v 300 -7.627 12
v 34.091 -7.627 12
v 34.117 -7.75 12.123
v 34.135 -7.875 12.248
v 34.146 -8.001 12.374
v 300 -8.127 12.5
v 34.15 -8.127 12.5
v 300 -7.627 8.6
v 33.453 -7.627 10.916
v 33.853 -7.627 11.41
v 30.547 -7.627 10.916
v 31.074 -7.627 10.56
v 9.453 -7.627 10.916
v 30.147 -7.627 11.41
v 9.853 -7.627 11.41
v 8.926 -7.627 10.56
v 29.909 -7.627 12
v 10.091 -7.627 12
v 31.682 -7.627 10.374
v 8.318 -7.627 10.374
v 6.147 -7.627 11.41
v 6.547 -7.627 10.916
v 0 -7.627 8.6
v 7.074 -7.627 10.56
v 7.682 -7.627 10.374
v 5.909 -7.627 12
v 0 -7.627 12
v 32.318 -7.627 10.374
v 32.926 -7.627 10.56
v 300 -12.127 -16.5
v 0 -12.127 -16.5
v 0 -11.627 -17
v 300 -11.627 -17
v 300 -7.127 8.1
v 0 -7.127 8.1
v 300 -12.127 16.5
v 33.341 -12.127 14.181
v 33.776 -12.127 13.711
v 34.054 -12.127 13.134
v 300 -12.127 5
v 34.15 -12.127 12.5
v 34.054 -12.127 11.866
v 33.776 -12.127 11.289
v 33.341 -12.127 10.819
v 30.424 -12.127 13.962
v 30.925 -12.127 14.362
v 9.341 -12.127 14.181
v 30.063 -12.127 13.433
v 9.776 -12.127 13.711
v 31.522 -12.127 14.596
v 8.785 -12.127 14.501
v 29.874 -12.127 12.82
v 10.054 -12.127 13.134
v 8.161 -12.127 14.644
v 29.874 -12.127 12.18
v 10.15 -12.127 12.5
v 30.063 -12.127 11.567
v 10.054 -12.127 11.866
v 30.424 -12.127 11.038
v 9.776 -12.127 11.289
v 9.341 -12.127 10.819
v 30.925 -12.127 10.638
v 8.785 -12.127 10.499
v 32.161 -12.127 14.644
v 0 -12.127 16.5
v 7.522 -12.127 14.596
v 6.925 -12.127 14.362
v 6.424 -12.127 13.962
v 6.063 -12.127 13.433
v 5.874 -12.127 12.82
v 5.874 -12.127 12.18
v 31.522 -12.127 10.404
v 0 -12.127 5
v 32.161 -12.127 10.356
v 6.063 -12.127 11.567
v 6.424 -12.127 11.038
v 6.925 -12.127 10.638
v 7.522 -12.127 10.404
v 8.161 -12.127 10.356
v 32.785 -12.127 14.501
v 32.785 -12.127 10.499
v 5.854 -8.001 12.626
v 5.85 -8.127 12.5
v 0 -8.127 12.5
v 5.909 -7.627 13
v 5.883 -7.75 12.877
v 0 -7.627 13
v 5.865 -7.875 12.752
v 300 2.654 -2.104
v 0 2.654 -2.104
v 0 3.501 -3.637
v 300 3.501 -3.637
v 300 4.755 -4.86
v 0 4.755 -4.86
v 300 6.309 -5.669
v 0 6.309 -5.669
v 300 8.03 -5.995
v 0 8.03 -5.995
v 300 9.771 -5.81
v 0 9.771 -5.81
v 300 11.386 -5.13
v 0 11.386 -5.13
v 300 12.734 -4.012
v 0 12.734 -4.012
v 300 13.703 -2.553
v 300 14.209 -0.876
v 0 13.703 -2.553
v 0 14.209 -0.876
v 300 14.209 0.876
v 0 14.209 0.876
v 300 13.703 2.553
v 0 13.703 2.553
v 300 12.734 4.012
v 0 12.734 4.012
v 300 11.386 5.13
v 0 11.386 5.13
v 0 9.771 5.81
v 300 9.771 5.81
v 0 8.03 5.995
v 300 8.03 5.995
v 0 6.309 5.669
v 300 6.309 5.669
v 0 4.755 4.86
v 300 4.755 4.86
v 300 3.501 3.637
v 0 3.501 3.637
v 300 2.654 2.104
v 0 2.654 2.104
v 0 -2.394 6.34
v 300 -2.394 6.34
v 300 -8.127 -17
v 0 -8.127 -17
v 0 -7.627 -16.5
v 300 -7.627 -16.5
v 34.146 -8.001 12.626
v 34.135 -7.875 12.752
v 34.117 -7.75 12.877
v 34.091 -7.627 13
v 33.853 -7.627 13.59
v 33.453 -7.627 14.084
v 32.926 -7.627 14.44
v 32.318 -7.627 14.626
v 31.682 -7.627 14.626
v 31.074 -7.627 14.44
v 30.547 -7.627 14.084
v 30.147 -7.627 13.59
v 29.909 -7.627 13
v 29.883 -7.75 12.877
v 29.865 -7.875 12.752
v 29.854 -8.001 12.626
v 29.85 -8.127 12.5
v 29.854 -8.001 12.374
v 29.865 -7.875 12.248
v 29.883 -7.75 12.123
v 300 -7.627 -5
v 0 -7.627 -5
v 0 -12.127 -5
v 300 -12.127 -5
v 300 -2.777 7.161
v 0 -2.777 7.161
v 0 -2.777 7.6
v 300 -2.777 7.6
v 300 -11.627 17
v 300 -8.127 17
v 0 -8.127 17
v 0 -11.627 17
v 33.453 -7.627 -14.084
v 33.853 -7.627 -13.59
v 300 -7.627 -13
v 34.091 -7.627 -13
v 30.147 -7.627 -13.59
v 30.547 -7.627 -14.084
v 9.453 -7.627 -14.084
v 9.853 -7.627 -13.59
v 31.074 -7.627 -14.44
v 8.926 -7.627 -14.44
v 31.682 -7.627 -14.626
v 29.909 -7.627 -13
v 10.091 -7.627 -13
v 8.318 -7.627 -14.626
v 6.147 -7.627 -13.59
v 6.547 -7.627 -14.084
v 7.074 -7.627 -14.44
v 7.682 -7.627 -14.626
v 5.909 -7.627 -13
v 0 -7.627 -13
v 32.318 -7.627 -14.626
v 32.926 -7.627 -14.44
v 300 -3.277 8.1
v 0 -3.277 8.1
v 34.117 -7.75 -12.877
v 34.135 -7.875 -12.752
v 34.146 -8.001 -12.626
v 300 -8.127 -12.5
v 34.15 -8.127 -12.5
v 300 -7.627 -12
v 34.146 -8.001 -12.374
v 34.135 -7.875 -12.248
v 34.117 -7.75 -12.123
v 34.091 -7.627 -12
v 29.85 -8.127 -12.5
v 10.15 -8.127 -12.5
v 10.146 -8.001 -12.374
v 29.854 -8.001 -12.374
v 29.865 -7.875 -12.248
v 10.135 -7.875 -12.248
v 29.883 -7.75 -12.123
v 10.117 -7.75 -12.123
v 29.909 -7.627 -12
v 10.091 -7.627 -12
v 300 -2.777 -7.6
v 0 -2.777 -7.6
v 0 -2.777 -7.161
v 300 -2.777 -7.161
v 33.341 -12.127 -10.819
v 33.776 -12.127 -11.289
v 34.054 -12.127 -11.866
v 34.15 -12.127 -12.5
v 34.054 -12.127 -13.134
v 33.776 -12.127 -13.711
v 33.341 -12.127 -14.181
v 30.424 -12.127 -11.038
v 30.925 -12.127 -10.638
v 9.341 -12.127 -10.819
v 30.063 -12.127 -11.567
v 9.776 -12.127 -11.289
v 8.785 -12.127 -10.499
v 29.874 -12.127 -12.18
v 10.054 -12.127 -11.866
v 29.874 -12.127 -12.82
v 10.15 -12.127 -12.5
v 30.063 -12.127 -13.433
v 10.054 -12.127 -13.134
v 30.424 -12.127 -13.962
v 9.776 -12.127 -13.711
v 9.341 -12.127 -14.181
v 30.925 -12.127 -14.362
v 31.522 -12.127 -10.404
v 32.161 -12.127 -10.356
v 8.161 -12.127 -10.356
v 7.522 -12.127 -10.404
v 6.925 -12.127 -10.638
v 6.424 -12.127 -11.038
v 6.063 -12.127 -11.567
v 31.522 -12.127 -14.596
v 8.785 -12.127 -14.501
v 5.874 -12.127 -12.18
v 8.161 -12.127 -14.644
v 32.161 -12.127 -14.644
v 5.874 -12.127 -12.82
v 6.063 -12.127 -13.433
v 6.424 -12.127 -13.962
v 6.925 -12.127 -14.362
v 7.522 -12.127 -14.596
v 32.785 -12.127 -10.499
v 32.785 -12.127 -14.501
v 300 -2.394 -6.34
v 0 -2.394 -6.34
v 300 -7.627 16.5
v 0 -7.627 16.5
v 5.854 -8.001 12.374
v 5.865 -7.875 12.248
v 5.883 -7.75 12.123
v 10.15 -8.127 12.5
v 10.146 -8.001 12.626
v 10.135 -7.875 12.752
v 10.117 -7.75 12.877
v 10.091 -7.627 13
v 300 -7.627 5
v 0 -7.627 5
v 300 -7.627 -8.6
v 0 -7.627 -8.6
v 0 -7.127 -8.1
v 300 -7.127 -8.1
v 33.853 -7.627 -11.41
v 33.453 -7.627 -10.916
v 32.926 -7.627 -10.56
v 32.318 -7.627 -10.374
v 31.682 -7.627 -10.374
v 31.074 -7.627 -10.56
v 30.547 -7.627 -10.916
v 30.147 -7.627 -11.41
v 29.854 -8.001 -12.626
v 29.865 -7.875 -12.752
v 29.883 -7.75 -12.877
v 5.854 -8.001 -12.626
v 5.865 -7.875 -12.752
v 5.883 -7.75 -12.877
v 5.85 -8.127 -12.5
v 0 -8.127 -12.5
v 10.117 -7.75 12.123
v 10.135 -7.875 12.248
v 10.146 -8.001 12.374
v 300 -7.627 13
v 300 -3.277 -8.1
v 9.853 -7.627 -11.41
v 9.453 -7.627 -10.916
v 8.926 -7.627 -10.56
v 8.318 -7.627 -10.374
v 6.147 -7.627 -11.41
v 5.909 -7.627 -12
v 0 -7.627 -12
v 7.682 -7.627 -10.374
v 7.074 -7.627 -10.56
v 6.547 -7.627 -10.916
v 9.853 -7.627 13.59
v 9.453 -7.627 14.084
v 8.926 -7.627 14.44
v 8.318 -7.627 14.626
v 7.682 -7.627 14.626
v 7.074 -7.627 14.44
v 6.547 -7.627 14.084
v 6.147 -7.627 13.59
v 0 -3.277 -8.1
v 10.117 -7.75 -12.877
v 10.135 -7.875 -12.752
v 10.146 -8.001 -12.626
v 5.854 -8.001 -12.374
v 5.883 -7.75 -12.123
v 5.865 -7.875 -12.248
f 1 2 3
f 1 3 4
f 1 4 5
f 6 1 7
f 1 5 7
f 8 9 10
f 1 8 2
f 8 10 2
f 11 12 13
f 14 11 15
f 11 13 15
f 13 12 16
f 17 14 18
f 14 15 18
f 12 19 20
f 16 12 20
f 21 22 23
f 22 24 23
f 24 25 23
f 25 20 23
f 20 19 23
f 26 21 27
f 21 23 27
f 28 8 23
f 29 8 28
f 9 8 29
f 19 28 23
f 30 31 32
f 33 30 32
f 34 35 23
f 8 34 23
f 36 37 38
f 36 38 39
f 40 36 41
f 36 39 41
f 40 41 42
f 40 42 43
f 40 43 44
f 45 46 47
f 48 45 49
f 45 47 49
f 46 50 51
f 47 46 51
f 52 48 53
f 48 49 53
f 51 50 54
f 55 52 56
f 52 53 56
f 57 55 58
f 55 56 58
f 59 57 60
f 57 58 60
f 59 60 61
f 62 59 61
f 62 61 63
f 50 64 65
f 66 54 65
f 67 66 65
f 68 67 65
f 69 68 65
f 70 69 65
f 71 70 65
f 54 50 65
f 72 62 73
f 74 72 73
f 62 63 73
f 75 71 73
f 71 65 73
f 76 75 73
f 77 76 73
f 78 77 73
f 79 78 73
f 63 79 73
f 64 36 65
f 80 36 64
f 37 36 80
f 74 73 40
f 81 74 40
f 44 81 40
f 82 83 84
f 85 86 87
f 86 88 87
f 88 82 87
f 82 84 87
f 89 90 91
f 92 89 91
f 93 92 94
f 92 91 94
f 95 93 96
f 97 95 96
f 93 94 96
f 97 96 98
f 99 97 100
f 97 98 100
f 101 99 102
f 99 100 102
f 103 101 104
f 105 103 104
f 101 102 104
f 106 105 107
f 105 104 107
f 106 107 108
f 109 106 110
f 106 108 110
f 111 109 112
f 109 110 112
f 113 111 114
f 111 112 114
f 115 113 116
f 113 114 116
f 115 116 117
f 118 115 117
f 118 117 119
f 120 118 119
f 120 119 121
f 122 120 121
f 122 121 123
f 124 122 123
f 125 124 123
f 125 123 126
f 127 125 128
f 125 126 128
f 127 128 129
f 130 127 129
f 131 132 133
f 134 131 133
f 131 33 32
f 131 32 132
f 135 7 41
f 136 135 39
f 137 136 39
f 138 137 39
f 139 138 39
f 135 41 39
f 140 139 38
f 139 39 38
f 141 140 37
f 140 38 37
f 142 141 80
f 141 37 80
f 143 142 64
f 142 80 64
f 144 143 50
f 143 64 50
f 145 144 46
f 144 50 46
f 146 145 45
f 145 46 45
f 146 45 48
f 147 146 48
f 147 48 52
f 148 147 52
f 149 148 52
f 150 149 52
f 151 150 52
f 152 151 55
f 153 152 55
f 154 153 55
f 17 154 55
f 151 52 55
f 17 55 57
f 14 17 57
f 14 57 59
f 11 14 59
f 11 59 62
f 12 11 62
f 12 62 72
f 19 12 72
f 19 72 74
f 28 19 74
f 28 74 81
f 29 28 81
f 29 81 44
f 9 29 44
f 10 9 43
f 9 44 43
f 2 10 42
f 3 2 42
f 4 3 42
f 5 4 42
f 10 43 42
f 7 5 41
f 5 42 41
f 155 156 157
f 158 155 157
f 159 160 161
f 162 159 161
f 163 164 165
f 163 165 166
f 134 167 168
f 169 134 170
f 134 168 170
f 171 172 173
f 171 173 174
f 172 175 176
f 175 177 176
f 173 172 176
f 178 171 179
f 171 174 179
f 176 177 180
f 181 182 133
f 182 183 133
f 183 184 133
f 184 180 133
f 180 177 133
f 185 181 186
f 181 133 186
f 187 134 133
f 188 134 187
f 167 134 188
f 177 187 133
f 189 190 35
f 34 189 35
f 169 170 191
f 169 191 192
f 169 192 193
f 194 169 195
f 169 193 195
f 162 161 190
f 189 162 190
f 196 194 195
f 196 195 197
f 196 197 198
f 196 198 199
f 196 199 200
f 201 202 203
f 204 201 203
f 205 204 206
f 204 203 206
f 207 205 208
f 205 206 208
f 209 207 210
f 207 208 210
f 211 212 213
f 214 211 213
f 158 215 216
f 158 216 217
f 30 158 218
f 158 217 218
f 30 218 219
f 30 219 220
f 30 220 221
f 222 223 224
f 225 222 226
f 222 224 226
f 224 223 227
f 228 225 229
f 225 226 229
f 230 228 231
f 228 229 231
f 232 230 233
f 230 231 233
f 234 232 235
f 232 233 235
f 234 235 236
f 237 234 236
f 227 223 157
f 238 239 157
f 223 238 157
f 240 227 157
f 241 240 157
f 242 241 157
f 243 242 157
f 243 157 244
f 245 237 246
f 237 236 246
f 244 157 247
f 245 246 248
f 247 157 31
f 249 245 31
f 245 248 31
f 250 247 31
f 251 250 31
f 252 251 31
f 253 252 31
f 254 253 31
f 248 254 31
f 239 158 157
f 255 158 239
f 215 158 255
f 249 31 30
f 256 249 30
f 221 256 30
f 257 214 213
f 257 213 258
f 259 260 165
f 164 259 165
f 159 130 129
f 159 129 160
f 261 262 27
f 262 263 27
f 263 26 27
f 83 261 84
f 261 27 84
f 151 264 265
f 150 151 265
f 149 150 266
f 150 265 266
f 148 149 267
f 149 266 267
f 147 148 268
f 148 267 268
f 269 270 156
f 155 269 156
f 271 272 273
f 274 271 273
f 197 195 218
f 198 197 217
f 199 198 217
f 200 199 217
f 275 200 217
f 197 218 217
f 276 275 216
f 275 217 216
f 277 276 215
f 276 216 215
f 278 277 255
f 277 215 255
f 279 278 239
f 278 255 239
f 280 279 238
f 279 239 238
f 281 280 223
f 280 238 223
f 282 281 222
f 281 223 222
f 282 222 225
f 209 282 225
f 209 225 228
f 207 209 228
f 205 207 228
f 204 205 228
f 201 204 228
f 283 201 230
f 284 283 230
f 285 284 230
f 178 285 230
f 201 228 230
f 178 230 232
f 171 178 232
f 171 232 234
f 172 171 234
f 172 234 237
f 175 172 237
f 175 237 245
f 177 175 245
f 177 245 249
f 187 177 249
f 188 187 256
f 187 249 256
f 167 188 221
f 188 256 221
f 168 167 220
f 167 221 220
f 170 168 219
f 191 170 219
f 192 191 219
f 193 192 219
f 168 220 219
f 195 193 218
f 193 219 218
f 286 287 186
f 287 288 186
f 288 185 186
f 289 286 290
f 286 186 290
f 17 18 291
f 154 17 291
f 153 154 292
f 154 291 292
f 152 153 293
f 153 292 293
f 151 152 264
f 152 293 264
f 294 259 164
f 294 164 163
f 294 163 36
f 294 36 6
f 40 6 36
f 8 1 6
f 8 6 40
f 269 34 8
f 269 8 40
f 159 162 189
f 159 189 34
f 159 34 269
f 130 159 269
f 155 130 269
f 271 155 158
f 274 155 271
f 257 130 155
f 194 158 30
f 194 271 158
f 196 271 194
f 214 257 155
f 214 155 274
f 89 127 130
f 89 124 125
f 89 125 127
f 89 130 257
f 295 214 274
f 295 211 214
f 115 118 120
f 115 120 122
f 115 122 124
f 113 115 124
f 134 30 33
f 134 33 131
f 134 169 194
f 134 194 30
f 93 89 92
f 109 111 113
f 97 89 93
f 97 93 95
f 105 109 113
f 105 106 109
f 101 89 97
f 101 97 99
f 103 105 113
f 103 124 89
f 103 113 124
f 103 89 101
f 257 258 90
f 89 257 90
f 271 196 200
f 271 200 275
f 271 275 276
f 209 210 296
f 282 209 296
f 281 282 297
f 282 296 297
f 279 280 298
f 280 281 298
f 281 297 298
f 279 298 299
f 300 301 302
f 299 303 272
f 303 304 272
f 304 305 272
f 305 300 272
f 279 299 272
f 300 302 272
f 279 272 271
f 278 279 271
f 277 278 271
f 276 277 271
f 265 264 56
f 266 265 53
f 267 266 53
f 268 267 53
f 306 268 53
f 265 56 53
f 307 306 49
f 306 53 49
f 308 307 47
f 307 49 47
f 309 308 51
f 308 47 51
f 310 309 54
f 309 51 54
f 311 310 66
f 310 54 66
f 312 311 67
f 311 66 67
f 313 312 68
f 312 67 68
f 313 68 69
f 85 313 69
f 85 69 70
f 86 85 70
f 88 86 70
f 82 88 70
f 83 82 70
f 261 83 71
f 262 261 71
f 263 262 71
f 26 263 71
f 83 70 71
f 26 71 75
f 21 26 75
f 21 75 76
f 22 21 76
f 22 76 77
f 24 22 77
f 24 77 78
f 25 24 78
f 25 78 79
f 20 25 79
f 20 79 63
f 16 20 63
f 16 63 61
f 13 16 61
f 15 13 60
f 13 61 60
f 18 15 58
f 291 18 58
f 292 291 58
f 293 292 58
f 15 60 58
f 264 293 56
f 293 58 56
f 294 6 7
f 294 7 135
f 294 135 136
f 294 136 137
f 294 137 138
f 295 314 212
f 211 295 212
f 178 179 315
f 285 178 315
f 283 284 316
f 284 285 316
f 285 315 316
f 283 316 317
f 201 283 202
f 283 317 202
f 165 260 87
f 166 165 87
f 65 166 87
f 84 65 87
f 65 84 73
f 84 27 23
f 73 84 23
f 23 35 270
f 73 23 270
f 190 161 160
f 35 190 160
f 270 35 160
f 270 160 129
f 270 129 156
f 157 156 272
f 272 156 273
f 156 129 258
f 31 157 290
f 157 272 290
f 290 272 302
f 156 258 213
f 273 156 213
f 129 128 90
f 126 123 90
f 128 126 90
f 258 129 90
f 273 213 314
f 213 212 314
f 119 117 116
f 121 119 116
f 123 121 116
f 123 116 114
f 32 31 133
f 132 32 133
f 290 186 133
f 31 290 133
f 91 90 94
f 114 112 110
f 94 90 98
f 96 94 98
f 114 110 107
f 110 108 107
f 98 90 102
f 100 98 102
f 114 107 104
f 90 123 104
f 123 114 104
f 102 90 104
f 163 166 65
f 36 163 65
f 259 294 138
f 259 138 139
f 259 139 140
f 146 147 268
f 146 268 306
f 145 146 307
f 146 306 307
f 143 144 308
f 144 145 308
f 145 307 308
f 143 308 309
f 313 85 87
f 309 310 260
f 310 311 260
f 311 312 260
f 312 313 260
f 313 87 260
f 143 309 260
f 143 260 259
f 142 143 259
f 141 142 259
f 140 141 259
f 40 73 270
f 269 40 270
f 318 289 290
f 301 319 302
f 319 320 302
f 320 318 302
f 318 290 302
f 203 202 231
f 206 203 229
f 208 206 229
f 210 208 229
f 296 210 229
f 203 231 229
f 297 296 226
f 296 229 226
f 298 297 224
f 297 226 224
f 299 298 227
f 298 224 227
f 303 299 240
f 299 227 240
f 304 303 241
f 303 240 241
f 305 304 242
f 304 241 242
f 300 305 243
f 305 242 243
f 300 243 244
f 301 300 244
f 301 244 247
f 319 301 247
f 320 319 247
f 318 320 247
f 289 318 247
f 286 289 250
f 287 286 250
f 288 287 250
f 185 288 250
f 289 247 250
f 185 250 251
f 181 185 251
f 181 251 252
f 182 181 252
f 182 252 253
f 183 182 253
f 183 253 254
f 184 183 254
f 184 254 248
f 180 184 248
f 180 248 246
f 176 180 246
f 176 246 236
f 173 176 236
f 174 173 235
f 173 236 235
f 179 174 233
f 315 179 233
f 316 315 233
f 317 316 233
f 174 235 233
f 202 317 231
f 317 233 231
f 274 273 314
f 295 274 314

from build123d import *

# Parameters (mm, degrees)
EXTRUDE1_DEPTH     = 300
SKETCH2_R          = 2.15
CUT_EXTRUDE1_DEPTH = 10


with BuildPart() as part:
    # Sketch1 → Extrude1 (new body)
    with BuildSketch(Plane(origin=(0, 0, 0), x_dir=(0, 0, -1), z_dir=(1, 0, 0))):
        with BuildLine():
            Line((-2.104066935, 2.654149118), (-6.339664187, -2.393639124))
            Line((-6.339664187, -2.393639124), (-7.161057992, -2.776661346))
            Line((-7.161057992, -2.776661346), (-7.600420417, -2.776661346))
            Line((-7.600420417, -2.776661346), (-8.100420417, -3.276661346))
            Line((-8.100420417, -3.276661346), (-8.100420417, -7.1268739))
            Line((-8.100420417, -7.1268739), (-8.600420417, -7.6268739))
            Line((-8.600420417, -7.6268739), (-12, -7.6268739))
            Line((-12, -7.6268739), (-12.5, -8.1268739))
            Line((-12.5, -8.1268739), (-13, -7.6268739))
            Line((-13, -7.6268739), (-16.5, -7.6268739))
            Line((-16.5, -7.6268739), (-17, -8.1268739))
            Line((-17, -8.1268739), (-17, -11.6268739))
            Line((-17, -11.6268739), (-16.5, -12.1268739))
            Line((-16.5, -12.1268739), (-5, -12.1268739))
            Line((-5, -12.1268739), (-5, -7.6268739))
            Line((-5, -7.6268739), (5, -7.6268739))
            Line((5, -7.6268739), (5, -12.1268739))
            Line((5, -12.1268739), (16.5, -12.1268739))
            Line((16.5, -12.1268739), (17, -11.6268739))
            Line((17, -11.6268739), (17, -8.1268739))
            Line((17, -8.1268739), (16.5, -7.6268739))
            Line((16.5, -7.6268739), (13, -7.6268739))
            Line((13, -7.6268739), (12.5, -8.1268739))
            Line((12.5, -8.1268739), (12, -7.6268739))
            Line((12, -7.6268739), (8.600420417, -7.6268739))
            Line((8.600420417, -7.6268739), (8.100420417, -7.1268739))
            Line((8.100420417, -7.1268739), (8.100420417, -3.276661346))
            Line((8.100420417, -3.276661346), (7.600420417, -2.776661346))
            Line((7.600420417, -2.776661346), (7.161057992, -2.776661346))
            Line((7.161057992, -2.776661346), (6.339664187, -2.393639124))
            Line((6.339664187, -2.393639124), (2.104066935, 2.654149118))
            ThreePointArc((2.104066935, 2.654149118), (0, 14.2731261), (-2.104066935, 2.654149118))
        make_face()
    extrude(amount=EXTRUDE1_DEPTH)

    # Sketch2 → Cut-Extrude1 (cut)
    with BuildSketch(Plane.XZ.offset(12.1268739)):
        with Locations((32, -12.5)):
            Circle(SKETCH2_R)
        with Locations((8, -12.5)):
            Circle(SKETCH2_R)
        with Locations((32, 12.5)):
            Circle(SKETCH2_R)
        with Locations((8, 12.5)):
            Circle(SKETCH2_R)
    extrude(amount=-CUT_EXTRUDE1_DEPTH, mode=Mode.SUBTRACT)


solid = part.part
